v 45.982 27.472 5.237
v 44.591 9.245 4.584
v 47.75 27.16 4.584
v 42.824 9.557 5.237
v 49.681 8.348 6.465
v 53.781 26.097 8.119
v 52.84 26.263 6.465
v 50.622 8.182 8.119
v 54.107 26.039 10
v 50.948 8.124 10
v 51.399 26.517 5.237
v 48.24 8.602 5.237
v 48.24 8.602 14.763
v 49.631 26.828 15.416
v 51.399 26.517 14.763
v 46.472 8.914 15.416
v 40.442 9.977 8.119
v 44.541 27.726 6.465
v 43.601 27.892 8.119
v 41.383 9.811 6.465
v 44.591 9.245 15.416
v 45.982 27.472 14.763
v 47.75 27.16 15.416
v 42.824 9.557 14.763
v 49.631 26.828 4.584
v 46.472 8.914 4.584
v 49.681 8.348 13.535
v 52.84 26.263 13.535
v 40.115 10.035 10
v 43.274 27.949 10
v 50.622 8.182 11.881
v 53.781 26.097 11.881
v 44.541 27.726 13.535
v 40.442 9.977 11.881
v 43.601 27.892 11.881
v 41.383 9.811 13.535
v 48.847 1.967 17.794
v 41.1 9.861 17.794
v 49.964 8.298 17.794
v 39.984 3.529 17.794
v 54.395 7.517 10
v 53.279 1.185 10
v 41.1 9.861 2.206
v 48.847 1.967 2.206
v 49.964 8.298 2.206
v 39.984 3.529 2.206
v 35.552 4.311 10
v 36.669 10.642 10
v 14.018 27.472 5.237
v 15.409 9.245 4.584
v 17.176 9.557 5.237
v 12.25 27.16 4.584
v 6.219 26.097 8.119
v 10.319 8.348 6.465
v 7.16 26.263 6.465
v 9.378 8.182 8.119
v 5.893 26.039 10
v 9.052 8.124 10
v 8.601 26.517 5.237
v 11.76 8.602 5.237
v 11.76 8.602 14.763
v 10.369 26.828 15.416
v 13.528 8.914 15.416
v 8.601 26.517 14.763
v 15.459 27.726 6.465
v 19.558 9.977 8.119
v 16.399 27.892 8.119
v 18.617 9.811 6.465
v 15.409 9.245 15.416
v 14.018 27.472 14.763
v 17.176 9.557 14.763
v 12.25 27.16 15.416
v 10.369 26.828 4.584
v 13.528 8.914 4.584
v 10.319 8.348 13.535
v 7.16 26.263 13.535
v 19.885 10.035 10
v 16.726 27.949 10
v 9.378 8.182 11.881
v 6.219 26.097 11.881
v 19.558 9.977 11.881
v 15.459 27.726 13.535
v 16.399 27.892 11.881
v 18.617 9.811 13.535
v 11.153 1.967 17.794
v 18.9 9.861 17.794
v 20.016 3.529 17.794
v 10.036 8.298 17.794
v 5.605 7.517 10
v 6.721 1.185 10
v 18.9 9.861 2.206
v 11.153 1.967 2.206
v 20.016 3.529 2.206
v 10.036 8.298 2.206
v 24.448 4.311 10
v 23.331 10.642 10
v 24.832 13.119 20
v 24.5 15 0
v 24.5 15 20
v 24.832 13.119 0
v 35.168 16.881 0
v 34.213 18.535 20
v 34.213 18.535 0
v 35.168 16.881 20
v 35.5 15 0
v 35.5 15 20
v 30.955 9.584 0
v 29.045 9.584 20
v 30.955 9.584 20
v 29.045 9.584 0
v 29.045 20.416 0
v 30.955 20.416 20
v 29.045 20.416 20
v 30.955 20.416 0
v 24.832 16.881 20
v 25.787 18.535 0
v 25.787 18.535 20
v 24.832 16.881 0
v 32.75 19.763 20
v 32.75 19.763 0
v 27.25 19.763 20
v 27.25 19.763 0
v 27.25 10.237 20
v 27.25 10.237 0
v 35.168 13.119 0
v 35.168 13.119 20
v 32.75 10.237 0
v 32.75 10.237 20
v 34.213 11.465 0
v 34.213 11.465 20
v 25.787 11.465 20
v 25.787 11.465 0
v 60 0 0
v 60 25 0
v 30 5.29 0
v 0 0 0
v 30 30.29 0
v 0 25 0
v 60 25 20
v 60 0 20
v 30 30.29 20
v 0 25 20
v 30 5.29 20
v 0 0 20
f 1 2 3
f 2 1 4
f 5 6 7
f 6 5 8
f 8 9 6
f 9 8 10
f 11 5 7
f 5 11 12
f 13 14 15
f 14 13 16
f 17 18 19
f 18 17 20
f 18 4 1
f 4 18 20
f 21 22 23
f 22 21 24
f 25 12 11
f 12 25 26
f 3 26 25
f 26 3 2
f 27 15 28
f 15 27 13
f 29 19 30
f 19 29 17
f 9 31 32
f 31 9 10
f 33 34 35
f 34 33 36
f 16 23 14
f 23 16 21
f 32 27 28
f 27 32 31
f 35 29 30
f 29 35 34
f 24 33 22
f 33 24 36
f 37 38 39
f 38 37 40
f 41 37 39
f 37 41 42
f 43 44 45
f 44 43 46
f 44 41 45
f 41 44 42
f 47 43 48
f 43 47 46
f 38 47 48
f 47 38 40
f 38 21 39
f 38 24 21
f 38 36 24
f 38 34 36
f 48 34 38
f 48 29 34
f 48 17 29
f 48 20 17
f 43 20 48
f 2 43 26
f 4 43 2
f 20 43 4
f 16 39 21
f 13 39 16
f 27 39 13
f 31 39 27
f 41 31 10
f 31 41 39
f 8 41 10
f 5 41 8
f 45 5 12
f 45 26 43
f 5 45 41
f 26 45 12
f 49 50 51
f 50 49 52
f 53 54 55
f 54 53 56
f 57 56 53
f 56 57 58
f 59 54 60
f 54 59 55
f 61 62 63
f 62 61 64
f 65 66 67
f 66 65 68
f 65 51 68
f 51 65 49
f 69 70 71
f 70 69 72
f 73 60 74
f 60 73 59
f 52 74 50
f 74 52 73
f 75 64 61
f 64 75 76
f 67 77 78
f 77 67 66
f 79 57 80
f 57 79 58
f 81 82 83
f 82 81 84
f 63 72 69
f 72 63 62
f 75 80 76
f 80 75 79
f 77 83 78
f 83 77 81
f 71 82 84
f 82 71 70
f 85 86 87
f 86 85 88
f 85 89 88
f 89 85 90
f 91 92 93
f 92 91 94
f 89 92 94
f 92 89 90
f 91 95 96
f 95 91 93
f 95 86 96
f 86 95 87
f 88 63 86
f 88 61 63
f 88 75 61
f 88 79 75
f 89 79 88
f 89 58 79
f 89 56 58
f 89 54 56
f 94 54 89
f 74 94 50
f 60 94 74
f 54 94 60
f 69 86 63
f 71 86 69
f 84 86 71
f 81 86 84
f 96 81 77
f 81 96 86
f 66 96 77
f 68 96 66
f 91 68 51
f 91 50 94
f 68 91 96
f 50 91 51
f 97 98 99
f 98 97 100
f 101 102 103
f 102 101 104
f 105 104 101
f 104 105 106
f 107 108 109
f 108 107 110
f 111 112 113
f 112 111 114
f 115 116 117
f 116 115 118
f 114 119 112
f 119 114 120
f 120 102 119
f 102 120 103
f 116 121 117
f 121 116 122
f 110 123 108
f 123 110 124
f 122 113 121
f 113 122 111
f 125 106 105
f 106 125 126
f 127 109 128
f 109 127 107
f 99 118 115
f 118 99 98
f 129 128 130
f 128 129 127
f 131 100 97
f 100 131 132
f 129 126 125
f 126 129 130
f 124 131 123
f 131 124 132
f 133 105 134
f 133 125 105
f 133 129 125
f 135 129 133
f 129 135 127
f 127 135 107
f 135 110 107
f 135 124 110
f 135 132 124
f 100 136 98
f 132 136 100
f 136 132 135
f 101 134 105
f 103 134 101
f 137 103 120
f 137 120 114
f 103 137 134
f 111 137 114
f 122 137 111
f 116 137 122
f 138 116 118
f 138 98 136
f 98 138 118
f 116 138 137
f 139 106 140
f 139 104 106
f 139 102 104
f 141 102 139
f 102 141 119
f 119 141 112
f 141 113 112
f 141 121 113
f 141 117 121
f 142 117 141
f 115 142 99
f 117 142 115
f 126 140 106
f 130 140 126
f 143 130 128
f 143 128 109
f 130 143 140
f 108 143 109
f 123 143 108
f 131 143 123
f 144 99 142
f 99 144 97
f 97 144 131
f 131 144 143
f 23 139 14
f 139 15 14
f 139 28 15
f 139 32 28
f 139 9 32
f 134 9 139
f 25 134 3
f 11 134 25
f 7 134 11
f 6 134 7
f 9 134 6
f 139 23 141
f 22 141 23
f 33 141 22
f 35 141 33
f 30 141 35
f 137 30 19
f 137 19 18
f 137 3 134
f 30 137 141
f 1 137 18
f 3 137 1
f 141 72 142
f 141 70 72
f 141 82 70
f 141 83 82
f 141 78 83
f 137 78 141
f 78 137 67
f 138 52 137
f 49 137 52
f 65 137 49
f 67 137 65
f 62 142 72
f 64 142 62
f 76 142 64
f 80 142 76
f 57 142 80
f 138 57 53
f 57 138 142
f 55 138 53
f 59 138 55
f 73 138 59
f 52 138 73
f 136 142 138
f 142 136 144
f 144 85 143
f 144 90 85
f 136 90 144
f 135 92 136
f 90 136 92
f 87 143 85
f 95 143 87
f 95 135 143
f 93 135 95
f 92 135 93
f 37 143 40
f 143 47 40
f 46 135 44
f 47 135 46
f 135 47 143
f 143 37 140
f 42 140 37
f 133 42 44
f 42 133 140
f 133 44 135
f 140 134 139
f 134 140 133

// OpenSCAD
//width
w = 60;

//height
h = 25;

//length
l = 20;

//angle
a = 10;

//radius
r = 5.5;

//nut radius
nr = 9;

//nut height
nh = 7;

//hole();


rotate([-90,0,0])
difference()
{
rotate([90,0,0])
linear_extrude(height=l)
polygon(points=[[0,0],[0,h],[(w/2),h+(w/2)*tan(a)],[w,h],[w,0],[w/2,(w/2)*tan(a)]]);



union()
{
hole();


translate([w,0,0])
mirror([1,0,0])
hole();


//sideways hole
rotate([90,0,0])
translate([w/2,l/2+5,-1])
cylinder(r=r, h=40);


}

}

module hole()
{
translate([0,0,10])
rotate([0,a,0])
union()
{
translate([(3*w/4),-l/2,-4])
//rotate([0,a,0])
cylinder(r=r, h=40);


translate([(3*w/4),-l/2,-nh])
//rotate([0,a,0])
cylinder(r=nr, h=nh*2,$fn=6);
}
}



/*

mirror([1,0,0])
translate([-(1*w/3),l/2,-4])
rotate([0,a,0])
cylinder(r=r, h=40);



difference()
{
union()
{
cube([w,l,h]);
}

union()
{
translate([w/2,0,h])
rotate([0,a,0])
cube([w,l,h]);

mirror([1,0,0])
translate([-w/2,0,h])
rotate([0,a,0])
cube([w,l,h]);




translate([(2*w/3),l/2,-nh])
rotate([0,a,0])
cylinder(r=nr, h=nh*2);

}
}


rotate([0,180,0])
translate([w/2,0,-h/2])
rotate([0,a,0])
cube([w,l,h]);
*/
